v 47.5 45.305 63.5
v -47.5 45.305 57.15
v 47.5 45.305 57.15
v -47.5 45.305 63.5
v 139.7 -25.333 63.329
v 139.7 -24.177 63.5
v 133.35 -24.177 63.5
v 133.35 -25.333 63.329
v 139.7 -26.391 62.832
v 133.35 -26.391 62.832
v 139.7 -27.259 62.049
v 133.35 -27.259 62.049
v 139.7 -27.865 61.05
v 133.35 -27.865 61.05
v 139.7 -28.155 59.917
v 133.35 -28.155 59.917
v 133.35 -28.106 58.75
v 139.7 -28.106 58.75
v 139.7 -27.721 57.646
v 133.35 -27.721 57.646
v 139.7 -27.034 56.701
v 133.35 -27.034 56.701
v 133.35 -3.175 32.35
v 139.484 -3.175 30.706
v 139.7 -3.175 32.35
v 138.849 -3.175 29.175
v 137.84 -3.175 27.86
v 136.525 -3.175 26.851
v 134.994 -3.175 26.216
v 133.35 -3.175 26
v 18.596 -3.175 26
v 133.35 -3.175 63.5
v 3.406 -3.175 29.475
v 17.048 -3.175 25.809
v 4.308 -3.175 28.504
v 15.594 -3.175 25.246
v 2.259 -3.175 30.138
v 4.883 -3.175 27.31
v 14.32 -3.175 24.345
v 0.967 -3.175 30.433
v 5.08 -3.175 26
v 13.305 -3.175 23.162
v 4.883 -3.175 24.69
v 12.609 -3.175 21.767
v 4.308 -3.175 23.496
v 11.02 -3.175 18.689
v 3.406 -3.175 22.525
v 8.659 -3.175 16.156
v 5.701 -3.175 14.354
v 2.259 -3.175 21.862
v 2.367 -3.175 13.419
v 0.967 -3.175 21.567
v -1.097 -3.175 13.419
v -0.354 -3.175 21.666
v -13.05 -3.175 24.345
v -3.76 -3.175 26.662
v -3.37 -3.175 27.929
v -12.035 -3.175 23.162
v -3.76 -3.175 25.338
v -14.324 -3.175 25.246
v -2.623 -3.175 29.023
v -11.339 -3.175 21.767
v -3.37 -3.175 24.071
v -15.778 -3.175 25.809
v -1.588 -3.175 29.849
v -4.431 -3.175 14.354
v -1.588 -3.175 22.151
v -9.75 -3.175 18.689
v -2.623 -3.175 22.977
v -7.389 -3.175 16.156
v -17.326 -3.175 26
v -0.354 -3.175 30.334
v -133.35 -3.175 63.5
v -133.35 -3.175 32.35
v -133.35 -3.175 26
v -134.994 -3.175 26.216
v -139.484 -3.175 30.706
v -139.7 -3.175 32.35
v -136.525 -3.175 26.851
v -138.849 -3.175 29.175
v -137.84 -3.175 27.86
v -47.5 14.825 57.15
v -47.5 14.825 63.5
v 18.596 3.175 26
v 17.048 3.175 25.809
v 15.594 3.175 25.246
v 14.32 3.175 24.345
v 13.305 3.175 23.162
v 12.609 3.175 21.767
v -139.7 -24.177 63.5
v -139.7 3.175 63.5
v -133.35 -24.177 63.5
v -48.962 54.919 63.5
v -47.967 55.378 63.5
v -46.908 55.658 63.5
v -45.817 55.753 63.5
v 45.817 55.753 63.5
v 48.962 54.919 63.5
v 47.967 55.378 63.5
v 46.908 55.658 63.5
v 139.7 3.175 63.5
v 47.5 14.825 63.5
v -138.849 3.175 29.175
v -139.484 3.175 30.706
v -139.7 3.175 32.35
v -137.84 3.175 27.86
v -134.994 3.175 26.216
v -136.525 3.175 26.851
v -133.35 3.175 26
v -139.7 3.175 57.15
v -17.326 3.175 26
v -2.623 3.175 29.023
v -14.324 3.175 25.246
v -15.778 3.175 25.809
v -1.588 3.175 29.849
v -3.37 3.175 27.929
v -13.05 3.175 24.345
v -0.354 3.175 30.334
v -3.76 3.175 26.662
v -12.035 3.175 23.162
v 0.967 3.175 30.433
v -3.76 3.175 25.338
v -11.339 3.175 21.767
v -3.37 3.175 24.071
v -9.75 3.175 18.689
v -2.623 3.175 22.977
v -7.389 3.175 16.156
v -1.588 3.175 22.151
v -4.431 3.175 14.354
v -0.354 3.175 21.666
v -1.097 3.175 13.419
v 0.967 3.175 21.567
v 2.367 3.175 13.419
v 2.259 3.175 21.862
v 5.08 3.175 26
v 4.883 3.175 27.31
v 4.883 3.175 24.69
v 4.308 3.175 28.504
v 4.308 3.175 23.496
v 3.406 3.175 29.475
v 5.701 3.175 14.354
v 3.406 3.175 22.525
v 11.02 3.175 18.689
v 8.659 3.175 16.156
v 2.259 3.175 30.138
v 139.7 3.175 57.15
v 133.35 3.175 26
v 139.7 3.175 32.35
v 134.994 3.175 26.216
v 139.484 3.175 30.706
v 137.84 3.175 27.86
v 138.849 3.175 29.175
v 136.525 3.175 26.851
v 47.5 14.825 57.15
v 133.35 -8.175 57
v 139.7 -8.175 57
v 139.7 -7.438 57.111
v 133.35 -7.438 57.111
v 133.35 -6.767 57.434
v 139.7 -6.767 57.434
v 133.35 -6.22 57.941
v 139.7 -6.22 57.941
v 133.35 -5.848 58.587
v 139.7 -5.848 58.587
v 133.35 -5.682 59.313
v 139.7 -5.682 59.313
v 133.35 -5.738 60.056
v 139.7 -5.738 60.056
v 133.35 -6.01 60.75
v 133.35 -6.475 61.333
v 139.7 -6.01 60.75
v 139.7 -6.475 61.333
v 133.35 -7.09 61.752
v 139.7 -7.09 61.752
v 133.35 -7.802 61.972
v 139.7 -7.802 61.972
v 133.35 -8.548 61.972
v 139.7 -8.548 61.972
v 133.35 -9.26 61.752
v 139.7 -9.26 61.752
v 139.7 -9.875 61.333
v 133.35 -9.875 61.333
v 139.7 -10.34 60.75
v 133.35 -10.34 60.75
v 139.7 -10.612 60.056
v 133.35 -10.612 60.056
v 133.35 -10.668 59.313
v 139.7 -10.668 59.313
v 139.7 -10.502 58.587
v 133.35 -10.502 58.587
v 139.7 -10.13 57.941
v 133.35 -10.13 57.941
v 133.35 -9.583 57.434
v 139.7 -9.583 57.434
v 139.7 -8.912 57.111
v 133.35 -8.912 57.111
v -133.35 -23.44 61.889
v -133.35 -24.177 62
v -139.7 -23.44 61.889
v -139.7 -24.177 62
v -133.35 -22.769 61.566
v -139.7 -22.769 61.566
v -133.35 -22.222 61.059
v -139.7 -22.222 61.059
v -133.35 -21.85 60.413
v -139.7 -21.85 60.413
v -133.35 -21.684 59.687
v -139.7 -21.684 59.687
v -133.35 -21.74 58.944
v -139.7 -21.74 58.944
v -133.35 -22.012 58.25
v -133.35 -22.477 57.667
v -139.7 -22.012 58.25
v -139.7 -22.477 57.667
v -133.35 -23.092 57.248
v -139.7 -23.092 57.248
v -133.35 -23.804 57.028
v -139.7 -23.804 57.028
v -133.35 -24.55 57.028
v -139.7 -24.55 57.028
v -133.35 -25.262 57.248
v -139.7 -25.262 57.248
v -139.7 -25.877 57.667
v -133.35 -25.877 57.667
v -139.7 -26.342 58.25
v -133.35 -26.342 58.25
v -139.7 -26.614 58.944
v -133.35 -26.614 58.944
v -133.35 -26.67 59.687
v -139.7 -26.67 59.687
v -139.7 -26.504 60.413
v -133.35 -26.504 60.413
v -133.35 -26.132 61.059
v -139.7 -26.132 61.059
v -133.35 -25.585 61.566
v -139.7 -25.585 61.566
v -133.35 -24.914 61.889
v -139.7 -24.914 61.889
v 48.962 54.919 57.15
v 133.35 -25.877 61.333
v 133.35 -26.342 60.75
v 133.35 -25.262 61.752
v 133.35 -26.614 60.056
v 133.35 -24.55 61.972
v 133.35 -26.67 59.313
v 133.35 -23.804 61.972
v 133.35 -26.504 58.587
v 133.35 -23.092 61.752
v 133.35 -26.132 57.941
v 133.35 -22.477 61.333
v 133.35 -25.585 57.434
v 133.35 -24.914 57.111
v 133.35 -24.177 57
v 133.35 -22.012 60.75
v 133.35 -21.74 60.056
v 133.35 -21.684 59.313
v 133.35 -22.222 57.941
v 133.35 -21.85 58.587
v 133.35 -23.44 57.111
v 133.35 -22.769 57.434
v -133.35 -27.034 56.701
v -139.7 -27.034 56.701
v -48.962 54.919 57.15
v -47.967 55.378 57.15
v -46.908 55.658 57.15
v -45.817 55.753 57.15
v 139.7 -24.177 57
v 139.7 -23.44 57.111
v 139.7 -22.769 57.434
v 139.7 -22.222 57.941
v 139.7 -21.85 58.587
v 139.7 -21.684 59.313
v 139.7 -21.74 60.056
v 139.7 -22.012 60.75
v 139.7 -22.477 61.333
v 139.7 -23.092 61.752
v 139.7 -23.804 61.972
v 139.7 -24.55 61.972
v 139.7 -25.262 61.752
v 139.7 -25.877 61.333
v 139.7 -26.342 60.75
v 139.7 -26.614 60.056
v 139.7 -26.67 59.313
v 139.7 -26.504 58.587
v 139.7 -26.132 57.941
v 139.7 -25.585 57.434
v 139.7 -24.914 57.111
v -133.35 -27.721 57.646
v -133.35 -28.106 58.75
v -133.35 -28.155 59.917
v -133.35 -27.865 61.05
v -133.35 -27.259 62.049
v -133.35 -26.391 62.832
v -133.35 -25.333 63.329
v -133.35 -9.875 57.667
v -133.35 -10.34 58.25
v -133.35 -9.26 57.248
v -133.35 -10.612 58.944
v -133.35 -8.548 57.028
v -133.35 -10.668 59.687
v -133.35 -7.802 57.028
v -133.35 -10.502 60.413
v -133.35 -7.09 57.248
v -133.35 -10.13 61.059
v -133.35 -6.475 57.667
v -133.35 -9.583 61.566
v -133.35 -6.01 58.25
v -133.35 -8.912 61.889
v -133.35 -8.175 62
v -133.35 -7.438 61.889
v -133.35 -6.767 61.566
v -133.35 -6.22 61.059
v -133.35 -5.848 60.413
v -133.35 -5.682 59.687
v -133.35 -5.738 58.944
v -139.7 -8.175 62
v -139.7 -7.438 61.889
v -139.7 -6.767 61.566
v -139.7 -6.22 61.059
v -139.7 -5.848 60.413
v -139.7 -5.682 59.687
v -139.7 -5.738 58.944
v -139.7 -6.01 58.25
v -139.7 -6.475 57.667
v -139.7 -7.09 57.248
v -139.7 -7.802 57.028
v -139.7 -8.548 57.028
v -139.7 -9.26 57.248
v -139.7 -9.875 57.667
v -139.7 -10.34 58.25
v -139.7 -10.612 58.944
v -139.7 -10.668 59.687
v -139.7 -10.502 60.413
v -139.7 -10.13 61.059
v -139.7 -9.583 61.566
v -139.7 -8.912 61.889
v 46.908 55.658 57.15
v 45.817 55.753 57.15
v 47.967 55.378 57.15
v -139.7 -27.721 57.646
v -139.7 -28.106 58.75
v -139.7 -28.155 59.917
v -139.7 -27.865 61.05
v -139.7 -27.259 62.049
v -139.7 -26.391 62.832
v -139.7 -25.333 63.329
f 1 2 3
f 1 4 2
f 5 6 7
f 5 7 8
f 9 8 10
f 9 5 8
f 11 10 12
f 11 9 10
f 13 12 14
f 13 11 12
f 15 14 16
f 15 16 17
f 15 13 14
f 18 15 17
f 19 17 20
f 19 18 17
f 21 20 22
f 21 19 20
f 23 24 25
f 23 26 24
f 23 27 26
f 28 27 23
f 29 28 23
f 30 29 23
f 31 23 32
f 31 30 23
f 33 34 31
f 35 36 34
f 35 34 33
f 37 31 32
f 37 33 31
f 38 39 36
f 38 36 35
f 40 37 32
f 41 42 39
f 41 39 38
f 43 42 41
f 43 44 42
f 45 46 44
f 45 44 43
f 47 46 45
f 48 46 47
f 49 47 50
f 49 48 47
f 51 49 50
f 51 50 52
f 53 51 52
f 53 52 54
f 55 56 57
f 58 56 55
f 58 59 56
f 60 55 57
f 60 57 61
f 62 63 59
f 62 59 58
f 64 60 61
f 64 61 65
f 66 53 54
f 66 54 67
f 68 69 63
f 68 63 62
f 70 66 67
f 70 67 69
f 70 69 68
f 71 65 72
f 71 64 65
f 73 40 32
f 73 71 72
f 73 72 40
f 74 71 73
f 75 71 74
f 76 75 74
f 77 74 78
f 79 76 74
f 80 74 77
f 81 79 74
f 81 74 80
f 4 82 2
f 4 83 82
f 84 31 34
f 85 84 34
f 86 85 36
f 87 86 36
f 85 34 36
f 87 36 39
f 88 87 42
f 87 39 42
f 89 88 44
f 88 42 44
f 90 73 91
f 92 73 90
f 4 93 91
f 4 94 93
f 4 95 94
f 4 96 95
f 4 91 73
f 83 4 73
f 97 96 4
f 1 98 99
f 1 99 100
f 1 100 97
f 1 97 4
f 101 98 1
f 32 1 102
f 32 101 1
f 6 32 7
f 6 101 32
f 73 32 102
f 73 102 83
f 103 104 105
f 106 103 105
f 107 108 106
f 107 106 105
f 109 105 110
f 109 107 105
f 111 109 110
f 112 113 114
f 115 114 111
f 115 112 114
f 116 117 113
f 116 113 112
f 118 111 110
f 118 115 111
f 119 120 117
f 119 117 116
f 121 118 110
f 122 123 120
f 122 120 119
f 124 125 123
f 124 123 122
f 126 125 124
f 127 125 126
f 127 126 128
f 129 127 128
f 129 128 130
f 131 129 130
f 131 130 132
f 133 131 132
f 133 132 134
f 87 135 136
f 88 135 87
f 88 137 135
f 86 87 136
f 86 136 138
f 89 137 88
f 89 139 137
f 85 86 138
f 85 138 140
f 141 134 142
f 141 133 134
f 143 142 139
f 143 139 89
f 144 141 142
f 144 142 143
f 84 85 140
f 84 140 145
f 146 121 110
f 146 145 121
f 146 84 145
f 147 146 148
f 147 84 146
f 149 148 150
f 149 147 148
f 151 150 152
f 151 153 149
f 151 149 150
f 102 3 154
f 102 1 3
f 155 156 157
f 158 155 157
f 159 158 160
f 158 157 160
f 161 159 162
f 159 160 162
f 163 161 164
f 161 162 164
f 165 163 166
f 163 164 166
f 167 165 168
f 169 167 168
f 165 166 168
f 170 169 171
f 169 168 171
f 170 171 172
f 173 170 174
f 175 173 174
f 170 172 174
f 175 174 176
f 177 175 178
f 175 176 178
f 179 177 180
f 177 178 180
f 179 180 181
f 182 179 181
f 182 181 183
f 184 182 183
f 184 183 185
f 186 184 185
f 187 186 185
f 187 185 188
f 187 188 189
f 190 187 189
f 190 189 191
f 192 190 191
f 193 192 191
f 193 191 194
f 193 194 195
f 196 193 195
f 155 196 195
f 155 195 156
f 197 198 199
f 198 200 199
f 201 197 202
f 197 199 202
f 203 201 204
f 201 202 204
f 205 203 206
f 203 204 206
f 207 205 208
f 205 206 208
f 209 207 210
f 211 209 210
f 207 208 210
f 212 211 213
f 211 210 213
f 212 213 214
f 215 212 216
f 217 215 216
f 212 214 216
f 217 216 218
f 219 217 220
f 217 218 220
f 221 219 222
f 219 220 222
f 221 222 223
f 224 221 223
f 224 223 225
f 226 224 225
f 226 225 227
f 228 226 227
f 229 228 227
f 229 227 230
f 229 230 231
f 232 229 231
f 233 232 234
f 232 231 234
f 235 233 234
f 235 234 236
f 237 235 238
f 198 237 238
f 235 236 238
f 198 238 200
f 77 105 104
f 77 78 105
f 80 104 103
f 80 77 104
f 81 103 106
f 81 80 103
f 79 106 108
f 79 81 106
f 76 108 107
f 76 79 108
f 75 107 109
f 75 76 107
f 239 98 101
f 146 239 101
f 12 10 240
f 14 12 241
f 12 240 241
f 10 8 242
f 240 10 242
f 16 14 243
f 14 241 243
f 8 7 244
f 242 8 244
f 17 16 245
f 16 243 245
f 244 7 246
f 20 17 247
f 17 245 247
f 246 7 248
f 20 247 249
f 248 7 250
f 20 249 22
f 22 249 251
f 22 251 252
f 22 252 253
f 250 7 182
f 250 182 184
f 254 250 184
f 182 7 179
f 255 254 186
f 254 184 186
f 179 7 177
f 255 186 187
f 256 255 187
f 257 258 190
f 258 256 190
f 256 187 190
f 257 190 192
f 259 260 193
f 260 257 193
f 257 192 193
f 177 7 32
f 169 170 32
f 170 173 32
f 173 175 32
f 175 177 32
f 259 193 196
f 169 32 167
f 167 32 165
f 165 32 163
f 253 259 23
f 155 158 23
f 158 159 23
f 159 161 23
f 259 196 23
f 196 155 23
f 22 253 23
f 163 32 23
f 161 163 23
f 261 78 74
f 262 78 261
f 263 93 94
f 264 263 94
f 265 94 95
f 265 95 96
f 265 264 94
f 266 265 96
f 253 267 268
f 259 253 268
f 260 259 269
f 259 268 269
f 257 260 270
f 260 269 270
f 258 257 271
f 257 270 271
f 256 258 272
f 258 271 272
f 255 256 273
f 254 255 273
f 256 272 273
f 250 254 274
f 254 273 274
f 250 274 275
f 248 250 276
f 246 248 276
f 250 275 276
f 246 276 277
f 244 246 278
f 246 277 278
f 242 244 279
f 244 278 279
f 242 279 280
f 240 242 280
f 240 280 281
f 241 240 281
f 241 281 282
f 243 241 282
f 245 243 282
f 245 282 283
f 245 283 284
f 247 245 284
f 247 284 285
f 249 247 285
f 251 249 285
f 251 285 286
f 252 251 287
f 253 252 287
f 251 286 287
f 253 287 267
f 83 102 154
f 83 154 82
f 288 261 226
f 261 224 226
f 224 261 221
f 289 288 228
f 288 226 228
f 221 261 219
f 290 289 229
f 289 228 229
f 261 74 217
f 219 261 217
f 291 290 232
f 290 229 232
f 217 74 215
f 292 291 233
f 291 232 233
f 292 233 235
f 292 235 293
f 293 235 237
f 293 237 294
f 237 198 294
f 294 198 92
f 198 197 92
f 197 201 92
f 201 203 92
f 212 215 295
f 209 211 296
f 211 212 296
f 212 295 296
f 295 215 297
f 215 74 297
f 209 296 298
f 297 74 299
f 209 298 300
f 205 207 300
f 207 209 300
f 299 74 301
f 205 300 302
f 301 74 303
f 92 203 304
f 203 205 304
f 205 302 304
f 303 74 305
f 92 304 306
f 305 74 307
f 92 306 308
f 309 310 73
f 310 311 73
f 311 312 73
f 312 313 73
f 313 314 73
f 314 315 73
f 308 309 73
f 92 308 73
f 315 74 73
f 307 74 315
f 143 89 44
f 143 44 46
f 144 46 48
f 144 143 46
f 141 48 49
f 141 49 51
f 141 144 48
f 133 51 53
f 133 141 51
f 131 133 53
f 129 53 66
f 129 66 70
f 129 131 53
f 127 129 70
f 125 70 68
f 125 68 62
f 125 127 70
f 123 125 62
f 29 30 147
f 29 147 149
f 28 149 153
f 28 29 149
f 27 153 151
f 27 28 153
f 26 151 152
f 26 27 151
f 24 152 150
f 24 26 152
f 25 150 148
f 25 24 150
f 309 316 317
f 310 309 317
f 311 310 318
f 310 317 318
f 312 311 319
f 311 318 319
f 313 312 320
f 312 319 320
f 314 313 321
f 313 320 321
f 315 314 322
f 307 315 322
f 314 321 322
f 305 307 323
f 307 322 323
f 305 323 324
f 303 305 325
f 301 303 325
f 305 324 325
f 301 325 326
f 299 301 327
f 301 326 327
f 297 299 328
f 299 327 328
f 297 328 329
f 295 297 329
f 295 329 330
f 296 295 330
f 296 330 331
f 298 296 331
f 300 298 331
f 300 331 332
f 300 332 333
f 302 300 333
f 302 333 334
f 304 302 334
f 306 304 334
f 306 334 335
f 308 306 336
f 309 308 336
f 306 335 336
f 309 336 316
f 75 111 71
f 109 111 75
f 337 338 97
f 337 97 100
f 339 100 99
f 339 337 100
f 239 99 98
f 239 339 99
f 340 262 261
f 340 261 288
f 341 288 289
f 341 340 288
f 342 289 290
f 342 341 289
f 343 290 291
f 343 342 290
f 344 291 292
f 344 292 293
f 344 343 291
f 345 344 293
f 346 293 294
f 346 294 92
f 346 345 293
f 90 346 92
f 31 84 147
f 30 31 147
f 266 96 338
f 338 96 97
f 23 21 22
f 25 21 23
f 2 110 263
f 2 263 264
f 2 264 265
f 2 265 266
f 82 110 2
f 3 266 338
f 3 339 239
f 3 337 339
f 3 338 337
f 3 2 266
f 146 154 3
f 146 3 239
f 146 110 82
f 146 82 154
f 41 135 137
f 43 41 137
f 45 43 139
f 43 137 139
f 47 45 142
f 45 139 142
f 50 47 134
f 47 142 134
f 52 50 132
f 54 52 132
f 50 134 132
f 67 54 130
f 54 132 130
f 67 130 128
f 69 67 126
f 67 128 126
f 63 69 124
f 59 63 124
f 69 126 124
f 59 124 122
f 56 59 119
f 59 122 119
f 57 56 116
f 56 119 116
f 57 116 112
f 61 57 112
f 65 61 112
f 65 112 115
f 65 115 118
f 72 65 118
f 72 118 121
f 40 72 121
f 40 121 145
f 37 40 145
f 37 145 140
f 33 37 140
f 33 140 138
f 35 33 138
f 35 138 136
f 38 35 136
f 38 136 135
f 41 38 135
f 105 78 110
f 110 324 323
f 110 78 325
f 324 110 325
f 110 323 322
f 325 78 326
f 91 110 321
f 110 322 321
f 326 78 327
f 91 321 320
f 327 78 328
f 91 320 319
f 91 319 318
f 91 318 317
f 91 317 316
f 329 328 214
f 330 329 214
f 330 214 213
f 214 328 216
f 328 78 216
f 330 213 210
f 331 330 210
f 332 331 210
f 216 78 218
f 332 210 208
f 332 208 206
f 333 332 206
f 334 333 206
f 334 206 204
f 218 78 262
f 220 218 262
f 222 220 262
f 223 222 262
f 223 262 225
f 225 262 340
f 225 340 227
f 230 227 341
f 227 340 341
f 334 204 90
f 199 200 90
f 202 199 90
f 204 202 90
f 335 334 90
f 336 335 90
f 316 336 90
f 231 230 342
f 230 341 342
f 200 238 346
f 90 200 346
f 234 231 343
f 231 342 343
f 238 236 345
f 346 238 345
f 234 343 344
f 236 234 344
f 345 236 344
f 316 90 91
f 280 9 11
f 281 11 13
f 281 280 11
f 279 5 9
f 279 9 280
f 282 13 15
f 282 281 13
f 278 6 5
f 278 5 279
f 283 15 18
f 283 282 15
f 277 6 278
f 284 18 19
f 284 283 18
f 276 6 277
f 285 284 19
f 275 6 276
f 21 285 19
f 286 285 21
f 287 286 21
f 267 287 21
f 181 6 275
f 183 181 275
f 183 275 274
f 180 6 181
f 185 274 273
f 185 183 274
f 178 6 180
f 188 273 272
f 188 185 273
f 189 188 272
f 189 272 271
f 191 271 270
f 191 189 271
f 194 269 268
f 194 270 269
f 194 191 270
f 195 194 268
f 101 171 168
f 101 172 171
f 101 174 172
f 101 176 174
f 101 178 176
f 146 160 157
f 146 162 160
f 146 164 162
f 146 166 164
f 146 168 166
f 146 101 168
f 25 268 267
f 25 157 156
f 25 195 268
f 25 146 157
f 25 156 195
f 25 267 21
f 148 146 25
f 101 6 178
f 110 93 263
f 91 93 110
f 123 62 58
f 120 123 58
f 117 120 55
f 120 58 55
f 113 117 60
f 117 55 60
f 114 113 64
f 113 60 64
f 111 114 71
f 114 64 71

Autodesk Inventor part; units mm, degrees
ref_plane "YZ Plane" through (0, 0, 0) normal (1, 0, 0) x (0, 1, 0)
ref_plane "XZ Plane" through (0, 0, 0) normal (0, 1, 0) x (-1, 0, 0)
ref_plane "XY Plane" through (0, 0, 0) normal (0, 0, 1) x (1, 0, 0)
sketch "Sketch1" plane through (0, 0, 0) normal (0, 0, 1) x (1, 0, 0)
  line L0 (139.7, -3.175) -> (-139.7, -3.175)
  line L1 (-139.7, -3.175) -> (-139.7, 3.175)
  line L2 (-139.7, 3.175) -> (139.7, 3.175)
  line L3 (139.7, 3.175) -> (139.7, -3.175)
  line L4 (139.7, -3.175) -> (-139.7, 3.175) construction
  line L5 (-139.7, -3.175) -> (139.7, 3.175) construction
  point P0 (0, 0)
  dimension "d0" = 279.4
  dimension "d1" = 6.35
extrude "Extrusion1" add sketch "Sketch1" along normal blind 63.5
sketch "Sketch2" plane through (-139.7, 3.175, 0) normal (0, 1, 0) x (1, 0, 0)
  circle A0 centre (140.335, -26) radius 4.445
  line L0 (139.7, 0) -> (139.7, -63.5833) construction
  line L1 (0, 0) -> (0, -63.5) construction
  line L2 (279.4, 0) -> (279.4, -63.5) construction
  line L3 (279.4, -63.5) -> (0, -63.5) projected
  dimension "d4" = 8.89
  dimension "d16" = 37.5
extrude "Extrusion2" cut sketch "Sketch2" against normal through all
sketch "Sketch3" plane through (0, 0, 63.5) normal (0, 0, 1) x (1, 0, 0)
  point P0 (0, 0)
sketch "Sketch4" plane through (-139.7, 3.175, 0) normal (0, 1, 0) x (1, 0, 0)
  line L0 (279.4, 0) -> (279.4, -63.5) projected
  line L1 (0, 0) -> (0, -63.5) projected
  line L2 (279.4, -63.5) -> (0, -63.5)
  line L3 (0, -63.5) -> (0, -57.15)
  line L4 (0, -57.15) -> (279.4, -57.15)
  line L5 (279.4, -57.15) -> (279.4, -63.5)
  point P0 (139.7, 0)
  dimension "d8" = 6.35
extrude "Extrusion3" add sketch "Sketch4" along normal blind 63.5
sketch "Sketch5" plane through (0, 0, 63.5) normal (0, 0, 1) x (1, 0, 0)
  line L0 (47.5, 14.825) -> (-47.5, 14.825)
  line L1 (-47.5, 14.825) -> (-47.5, 45.305)
  line L2 (-47.5, 45.305) -> (47.5, 45.305)
  line L3 (47.5, 45.305) -> (47.5, 14.825)
  line L4 (47.5, 14.825) -> (-47.5, 45.305) construction
  line L5 (-47.5, 14.825) -> (47.5, 45.305) construction
  line L6 (-139.7, -3.175) -> (139.7, -3.175) projected
  point P0 (0, 0)
  point P1 (0, 30.065)
  dimension "d11" = 95
  dimension "d12" = 30.48
  dimension "d13" = 18
extrude "Extrusion4" cut sketch "Sketch5" against normal through all
sketch "Sketch8" plane through (0, 0, 63.5) normal (0, 0, 1) x (1, 0, 0)
  line L0 (-139.7, -3.175) -> (139.7, -3.175) construction
  line L1 (-47.5, -3.175) -> (-47.5, 66.9222) construction
  line L2 (-139.7, 66.675) -> (139.7, 66.675) construction
  line L3 (47.5, 66.675) -> (47.5, -3.175) construction
  line L4 (47.5, 45.305) -> (47.5, 14.825) construction
  line L5 (-47.5, 14.825) -> (-47.5, 45.305) construction
  line L6 (-139.7, -3.175) -> (-139.7, 66.675) construction
  line L7 (-139.7, 3.175) -> (139.7, 3.175) construction
  line L8 (139.7, -3.175) -> (139.7, 66.675) construction
  line L9 (-139.7, 55.753) -> (139.7, 55.753)
  line L10 (-47.5, 55.753) -> (-139.7, 3.175)
  line L11 (47.5, 55.753) -> (139.7, 3.175)
  line L12 (-47.5, 14.825) -> (-47.5, 45.305) projected
  line L13 (-47.5, 45.305) -> (47.5, 45.305) projected
  line L14 (47.5, 45.305) -> (47.5, 14.825) projected
  line L15 (47.5, 14.825) -> (-47.5, 14.825) projected
  line L16 (-139.7, -3.175) -> (-139.7, 66.675) projected
  line L17 (-139.7, -3.175) -> (139.7, -3.175) projected
  line L18 (139.7, -3.175) -> (139.7, 66.675) projected
  line L19 (-139.7, 66.675) -> (139.7, 66.675) projected
  point P0 (0, 0)
  point P1 (-47.5, 30.065)
  point P2 (-139.7, 3.175)
  point P3 (139.7, 3.175)
  dimension "d21" = 0
  dimension "d22" = 0
  dimension "d23" = 6.35
  dimension "d24" = 10.922
extrude "Extrusion5" cut sketch "Sketch8" against normal through all contours L16 L19 L18 L9 | L9 L10 L16 | L9 L18 L11
sketch "Sketch11" plane through (-139.7, 3.175, 0) normal (0, 1, 0) x (1, 0, 0)
  circle A0 centre (140.335, -26) radius 4.445 projected
  circle A1 centre (140.335, -26) radius 12.7
  line L0 (127.635, -26) -> (0, -26)
  line L1 (0, 0) -> (0, -57.15) projected
  line L2 (153.035, -26) -> (279.4, -26)
  line L3 (279.4, 0) -> (279.4, -57.15) projected
  line L4 (279.4, 0) -> (0, 0) projected
  point P0 (139.7, 0)
  point P1 (0, -34.9602)
  point P2 (280.67, -34.9602)
  point P3 (279.4, -57.15)
  dimension "d43" = 25.4
extrude "Extrusion8" cut sketch "Sketch11" against normal through all contours A1 L0 L1 L4 L3 L2
fillet "Fillet5" radius 6.35 6 edges at (47.5, 55.753, 60.325) (-47.5, 55.753, 60.325) (139.7, 0, 26) (13.335, 0, 26) (-12.065, 0, 26) (-139.7, 0, 26)
sketch "Sketch15" plane through (-139.7, -3.175, 63.5) normal (-1, 0, 0) x (0, 0, 1)
  circle A0 centre (-4, -5) radius 2.5
  line L0 (-31.15, 0) -> (-31.15, 6.35) projected
  line L1 (-31.15, 0) -> (0, 0) projected
  line L2 (0, 0) -> (0, 6.35) projected
  line L3 (0, 6.35) -> (-6.35, 6.35) projected
  line L4 (-31.15, 6.35) -> (-6.35, 6.35) projected
  line L5 (0, 0) -> (0, -21.002)
  circle A1 centre (-4, -21.002) radius 2.5
  circle A2 centre (-4, -21.002) radius 4
  line L6 (-31.15, 0) -> (0, 0) projected
  line L7 (-31.15, 0) -> (-6.7994, -23.8591)
  point P0 (-63.5, 3.175)
  dimension "d64" = 5
  dimension "d65" = 4
  dimension "d66" = 5
  dimension "d67" = 5
  dimension "d68" = 16.002
extrude "Extrusion11" add sketch "Sketch15" against normal blind 6.35 contours L1 L5 A2 L7 | A2
sketch "Sketch16" plane through (139.7, -3.175, 63.5) normal (1, 0, 0) x (0, 0, -1)
  line L0 (0, 0) -> (0, -21.002) projected
  arc A0 (0, -21.002) -> (6.7994, -23.8591) centre (4, -21.002) ccw projected
  line L1 (6.7994, -23.8591) -> (31.15, 0) projected
  line L2 (0, 0) -> (31.15, 0) projected
  circle A1 centre (4, -5) radius 2.5 projected
  circle A2 centre (4, -21.002) radius 2.5 projected
  point P0 (63.5, 3.175)
extrude "Extrusion12" add sketch "Sketch16" against normal blind 6.35
properties part number "CS_Camera_Mount"
